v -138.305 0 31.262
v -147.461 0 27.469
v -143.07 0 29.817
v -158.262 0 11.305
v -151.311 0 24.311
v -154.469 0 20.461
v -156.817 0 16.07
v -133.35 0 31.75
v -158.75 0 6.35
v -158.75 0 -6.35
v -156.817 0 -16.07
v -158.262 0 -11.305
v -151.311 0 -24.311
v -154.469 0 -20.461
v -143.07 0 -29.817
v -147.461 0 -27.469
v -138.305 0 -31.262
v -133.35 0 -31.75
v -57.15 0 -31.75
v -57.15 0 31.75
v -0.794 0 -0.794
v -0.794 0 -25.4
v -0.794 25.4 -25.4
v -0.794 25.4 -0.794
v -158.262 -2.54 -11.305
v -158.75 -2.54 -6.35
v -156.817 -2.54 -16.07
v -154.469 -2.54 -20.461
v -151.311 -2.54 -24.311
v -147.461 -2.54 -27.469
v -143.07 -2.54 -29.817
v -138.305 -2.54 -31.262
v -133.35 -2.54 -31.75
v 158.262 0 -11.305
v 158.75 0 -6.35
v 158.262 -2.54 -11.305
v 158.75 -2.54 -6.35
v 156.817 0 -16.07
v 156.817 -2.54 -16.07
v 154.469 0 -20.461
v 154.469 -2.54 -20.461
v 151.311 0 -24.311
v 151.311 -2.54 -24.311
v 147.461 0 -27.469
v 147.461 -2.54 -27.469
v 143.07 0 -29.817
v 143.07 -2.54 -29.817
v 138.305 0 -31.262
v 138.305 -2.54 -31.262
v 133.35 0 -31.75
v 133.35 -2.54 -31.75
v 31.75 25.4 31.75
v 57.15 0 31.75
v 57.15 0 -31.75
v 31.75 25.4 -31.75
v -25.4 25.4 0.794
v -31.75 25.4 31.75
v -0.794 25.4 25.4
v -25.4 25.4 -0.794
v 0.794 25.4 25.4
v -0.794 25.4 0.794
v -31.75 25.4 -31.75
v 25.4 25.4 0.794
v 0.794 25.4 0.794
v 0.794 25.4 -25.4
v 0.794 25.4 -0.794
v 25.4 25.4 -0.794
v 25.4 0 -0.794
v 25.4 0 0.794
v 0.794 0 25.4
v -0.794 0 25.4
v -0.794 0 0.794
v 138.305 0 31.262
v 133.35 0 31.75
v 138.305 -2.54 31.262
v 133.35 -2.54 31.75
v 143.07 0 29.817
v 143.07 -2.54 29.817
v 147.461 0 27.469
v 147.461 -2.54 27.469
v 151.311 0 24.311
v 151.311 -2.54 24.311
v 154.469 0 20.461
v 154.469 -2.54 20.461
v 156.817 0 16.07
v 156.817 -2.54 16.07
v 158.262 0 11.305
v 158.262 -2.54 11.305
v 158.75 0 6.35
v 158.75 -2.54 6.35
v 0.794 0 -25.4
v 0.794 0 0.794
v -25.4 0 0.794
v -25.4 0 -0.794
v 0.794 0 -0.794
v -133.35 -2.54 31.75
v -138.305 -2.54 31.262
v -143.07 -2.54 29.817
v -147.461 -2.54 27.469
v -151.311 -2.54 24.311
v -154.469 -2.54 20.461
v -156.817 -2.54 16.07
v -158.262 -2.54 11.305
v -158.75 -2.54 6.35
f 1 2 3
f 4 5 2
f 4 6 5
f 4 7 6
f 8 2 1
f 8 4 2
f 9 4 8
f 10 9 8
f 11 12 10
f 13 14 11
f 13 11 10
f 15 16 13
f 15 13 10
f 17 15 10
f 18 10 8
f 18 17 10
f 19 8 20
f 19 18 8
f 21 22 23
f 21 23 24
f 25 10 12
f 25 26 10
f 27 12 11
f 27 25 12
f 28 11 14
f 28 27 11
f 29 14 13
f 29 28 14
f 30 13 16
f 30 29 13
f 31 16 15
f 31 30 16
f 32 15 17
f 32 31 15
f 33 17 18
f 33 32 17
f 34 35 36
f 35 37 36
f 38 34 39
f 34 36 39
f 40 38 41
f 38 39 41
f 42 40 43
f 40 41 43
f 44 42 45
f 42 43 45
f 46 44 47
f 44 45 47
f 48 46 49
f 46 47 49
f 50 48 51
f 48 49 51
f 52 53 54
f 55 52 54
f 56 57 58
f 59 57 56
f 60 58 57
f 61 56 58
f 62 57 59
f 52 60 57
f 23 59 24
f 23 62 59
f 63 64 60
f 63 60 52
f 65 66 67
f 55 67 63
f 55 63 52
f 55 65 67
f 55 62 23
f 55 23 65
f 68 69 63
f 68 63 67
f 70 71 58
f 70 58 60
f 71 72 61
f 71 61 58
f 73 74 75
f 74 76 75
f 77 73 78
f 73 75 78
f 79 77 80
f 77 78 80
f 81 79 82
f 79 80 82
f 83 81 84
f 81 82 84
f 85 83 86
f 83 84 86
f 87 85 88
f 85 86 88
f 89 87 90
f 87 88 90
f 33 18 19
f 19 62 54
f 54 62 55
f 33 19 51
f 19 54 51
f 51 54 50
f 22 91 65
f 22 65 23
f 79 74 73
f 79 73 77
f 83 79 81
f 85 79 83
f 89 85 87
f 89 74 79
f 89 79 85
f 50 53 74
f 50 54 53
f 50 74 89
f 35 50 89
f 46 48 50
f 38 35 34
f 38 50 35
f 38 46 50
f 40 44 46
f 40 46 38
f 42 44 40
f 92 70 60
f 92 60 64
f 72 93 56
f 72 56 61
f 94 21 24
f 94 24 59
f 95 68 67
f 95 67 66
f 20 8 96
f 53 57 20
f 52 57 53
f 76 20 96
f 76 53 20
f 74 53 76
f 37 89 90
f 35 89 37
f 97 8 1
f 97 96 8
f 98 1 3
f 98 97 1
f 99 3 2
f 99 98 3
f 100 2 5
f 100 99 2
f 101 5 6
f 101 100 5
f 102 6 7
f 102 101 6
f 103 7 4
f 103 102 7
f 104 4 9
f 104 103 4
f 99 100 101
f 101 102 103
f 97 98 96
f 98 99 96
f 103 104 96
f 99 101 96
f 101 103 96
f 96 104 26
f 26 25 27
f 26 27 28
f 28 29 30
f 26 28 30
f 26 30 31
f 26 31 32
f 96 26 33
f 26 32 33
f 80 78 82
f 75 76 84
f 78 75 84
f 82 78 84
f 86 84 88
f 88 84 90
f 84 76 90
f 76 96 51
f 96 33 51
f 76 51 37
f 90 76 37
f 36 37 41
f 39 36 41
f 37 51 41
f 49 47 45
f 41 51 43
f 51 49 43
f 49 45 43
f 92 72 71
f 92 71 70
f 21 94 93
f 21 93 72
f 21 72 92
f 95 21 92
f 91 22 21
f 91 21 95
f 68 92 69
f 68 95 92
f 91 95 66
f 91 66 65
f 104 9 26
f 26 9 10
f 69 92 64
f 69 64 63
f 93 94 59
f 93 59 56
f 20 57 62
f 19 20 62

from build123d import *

# Parameters (mm, degrees)
SKETCH1_W           = 63.5
SKETCH1_H           = 63.5
BOSS_EXTRUDE1_DEPTH = 25.4
SKETCH1_3_W         = 63.5
SKETCH1_3_H         = 63.5
BOSS_EXTRUDE2_DEPTH = 2.54
SKETCH1_4_W         = 127
SKETCH1_4_H         = 63.5
BOSS_EXTRUDE3_DEPTH = 2.54
CHAMFER2_SIZE       = 25.4
FILLET1_R           = 25.4


with BuildPart() as part:
    # Sketch1 → Boss-Extrude1 (new body)
    with BuildSketch(Plane(origin=(0, 0, 0), x_dir=(1, 0, 0), z_dir=(0, 1, 0))):
        Rectangle(SKETCH1_W, SKETCH1_H)
        Polygon((-0.79375, 25.4), (-0.79375, 0.79375), (-25.4, 0.79375), (-25.4, -0.79375), (-0.79375, -0.79375), (-0.79375, -25.4), (0.79375, -25.4), (0.79375, -0.79375), (25.4, -0.79375), (25.4, 0.79375), (0.79375, 0.79375), (0.79375, 25.4), align=None, mode=Mode.SUBTRACT)
    extrude(amount=BOSS_EXTRUDE1_DEPTH)

    # Sketch1<3> → Boss-Extrude2 (add)
    with BuildSketch(Plane(origin=(0, 0, 0), x_dir=(1, 0, 0), z_dir=(0, 1, 0))):
        Rectangle(SKETCH1_3_W, SKETCH1_3_H)
    extrude(amount=-BOSS_EXTRUDE2_DEPTH)

    # Sketch1<4> → Boss-Extrude3 (add)
    with BuildSketch(Plane(origin=(0, 0, 0), x_dir=(1, 0, 0), z_dir=(0, 1, 0))):
        with Locations((95.25, 0)):
            Rectangle(SKETCH1_4_W, SKETCH1_4_H)
        with Locations((-95.25, 0)):
            Rectangle(SKETCH1_4_W, SKETCH1_4_H)
    extrude(amount=-BOSS_EXTRUDE3_DEPTH)

    # Chamfer2
    chamfer2_edges = [part.edges().sort_by_distance(p)[0] for p in [
        (31.75, 0, 0),
        (-31.75, 0, 0),
    ]]
    chamfer(chamfer2_edges, length=CHAMFER2_SIZE - 0.0001)  # a hair under: the kernel refuses the full size

    # Fillet1
    fillet1_edges = [part.edges().sort_by_distance(p)[0] for p in [
        (158.75, -1.27, -31.75),
        (158.75, -1.27, 31.75),
        (-158.75, -1.27, -31.75),
        (-158.75, -1.27, 31.75),
    ]]
    fillet(fillet1_edges, radius=FILLET1_R)


solid = part.part
